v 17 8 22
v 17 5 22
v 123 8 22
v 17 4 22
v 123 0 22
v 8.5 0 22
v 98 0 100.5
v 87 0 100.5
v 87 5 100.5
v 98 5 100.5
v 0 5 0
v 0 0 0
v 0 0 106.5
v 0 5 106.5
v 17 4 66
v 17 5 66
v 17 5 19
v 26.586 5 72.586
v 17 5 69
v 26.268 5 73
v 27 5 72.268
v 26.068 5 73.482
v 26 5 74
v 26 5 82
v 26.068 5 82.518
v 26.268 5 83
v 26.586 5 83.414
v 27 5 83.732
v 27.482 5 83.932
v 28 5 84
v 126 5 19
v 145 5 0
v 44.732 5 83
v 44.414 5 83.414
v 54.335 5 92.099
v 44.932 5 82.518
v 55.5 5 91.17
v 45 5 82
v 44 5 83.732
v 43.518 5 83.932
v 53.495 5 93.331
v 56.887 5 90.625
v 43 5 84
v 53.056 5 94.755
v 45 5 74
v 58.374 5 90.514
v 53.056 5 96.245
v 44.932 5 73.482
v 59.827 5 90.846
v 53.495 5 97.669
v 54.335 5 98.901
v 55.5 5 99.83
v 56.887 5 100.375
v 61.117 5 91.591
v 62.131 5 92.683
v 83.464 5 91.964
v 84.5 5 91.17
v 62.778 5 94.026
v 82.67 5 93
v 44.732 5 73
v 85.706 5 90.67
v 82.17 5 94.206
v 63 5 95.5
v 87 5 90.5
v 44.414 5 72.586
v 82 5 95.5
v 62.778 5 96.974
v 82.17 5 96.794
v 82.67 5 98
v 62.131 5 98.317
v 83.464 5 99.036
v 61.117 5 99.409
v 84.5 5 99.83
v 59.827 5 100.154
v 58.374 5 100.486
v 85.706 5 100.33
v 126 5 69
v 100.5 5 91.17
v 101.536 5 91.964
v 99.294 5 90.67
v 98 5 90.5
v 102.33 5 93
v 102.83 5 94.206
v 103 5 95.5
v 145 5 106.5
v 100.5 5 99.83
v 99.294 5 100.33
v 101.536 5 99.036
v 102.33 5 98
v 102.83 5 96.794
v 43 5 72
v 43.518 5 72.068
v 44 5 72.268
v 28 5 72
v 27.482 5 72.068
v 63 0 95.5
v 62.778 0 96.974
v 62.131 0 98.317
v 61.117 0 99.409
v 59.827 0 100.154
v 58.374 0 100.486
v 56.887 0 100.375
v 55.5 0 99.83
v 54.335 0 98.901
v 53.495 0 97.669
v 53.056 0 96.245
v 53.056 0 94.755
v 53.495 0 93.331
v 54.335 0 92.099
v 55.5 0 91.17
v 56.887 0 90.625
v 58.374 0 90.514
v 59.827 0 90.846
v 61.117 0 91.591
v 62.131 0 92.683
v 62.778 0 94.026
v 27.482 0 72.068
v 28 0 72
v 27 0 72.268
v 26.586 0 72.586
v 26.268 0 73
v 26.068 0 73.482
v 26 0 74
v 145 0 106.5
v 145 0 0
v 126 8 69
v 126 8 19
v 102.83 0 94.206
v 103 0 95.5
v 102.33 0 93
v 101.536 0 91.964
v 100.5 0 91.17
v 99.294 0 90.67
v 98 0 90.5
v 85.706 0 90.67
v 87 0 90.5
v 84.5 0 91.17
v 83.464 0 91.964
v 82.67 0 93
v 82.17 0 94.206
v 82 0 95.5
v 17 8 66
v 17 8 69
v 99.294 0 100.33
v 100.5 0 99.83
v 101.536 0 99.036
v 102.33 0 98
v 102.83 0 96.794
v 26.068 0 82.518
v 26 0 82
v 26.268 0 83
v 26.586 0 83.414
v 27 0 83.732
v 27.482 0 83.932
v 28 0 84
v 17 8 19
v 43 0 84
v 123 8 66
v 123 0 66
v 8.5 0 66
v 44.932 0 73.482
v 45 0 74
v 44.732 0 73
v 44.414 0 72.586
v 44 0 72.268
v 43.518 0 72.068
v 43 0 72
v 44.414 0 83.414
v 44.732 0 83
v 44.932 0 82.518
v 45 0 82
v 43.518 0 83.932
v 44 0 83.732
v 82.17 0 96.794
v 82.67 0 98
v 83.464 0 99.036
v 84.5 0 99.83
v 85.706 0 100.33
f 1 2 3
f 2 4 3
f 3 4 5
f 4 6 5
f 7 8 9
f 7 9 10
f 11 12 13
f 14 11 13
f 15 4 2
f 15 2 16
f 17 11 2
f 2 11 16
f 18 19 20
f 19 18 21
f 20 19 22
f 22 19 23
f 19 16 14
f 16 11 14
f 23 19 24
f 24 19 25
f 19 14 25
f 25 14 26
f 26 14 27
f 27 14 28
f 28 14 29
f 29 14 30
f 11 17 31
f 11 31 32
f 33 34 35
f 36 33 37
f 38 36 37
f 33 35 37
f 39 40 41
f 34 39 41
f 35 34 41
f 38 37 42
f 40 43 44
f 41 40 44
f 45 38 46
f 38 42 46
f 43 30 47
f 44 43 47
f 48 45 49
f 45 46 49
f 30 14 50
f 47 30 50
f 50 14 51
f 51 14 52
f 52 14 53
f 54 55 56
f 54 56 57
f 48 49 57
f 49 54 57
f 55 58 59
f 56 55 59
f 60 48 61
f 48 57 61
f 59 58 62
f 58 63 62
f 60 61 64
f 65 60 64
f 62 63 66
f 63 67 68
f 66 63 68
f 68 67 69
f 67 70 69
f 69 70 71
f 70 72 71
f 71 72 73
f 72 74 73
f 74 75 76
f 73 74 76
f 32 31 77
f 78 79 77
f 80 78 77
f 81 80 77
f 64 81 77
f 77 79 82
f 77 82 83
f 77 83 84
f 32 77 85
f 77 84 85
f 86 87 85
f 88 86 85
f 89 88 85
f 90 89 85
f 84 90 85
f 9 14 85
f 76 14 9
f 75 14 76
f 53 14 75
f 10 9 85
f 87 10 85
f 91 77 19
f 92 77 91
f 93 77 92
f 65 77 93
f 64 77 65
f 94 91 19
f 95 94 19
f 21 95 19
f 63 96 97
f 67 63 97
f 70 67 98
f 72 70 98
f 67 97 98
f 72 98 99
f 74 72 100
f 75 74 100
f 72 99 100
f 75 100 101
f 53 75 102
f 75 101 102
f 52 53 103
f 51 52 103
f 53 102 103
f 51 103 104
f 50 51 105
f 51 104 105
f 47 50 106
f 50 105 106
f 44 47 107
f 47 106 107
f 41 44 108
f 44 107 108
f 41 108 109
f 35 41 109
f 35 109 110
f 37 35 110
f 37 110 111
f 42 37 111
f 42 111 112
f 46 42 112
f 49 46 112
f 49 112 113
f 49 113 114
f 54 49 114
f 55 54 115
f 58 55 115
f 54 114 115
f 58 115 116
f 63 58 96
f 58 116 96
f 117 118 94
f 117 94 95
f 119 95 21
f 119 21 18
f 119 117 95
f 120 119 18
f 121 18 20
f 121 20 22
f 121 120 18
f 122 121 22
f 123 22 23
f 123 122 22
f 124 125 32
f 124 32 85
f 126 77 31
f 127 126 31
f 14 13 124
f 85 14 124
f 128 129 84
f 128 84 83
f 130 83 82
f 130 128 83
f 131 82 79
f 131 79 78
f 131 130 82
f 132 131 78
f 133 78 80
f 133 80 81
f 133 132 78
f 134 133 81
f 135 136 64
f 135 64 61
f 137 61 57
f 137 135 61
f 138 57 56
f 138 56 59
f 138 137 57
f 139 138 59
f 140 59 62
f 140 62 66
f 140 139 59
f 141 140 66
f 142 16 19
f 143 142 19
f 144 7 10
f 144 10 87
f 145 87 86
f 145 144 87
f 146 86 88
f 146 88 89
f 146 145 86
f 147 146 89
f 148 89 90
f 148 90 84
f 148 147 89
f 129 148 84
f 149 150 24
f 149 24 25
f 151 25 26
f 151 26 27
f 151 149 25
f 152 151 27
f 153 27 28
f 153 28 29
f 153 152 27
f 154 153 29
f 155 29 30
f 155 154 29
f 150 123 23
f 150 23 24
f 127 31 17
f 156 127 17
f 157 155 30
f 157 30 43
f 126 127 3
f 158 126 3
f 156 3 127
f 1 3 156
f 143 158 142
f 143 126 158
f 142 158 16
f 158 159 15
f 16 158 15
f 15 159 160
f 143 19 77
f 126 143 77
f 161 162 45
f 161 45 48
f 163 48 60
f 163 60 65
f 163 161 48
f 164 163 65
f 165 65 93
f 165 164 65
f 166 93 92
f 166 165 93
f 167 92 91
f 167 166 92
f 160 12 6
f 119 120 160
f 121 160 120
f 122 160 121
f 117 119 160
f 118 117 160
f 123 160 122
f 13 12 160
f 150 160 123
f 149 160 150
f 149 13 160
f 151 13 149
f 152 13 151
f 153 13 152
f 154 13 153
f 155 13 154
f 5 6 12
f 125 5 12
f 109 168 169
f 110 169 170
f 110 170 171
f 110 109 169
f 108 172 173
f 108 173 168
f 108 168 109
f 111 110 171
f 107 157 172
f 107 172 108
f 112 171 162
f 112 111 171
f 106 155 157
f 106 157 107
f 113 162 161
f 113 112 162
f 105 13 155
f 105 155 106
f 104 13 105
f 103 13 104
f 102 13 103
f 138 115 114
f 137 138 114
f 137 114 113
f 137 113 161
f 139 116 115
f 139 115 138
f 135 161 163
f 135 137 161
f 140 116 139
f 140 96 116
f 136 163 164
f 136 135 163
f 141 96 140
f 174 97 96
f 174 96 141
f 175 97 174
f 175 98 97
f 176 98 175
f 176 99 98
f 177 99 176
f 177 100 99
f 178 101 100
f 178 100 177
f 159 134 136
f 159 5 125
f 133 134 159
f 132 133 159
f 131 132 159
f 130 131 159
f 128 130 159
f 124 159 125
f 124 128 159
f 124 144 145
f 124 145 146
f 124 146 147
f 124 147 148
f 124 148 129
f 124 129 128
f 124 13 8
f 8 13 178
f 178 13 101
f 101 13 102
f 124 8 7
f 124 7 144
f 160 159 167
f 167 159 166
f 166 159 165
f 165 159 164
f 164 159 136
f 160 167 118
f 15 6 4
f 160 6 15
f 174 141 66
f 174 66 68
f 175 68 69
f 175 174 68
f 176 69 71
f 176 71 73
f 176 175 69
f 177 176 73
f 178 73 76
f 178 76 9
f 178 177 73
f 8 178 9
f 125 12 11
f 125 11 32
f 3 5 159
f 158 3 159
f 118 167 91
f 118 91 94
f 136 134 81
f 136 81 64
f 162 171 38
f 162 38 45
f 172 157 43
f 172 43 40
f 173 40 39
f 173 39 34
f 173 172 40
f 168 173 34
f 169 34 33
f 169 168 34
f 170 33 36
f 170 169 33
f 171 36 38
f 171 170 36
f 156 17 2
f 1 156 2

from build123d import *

# Parameters (mm, degrees)
F0_W     = 145
F0_H     = 106.5
F0_W_2   = 106
F0_H_2   = 44
F0_R     = 5
F1_DEPTH = 5
F2_SIZE2 = 8.5
F2_SIZE  = 4
F4_DEPTH = 3


with BuildPart() as f1:
    # F0 (on Front) → F1 (new body)
    with BuildSketch(Plane.XZ):
        with Locations((72.5, 53.25)):
            Rectangle(F0_W, F0_H)
        with Locations((70, 44)):
            Rectangle(F0_W_2, F0_H_2, mode=Mode.SUBTRACT)
        with BuildLine():
            ThreePointArc((26, 82), (26.585786, 83.414214), (28, 84))
            Line((28, 84), (43, 84))
            ThreePointArc((43, 84), (44.414214, 83.414214), (45, 82))
            Line((45, 82), (45, 74))
            ThreePointArc((45, 74), (44.414214, 72.585786), (43, 72))
            Line((43, 72), (28, 72))
            ThreePointArc((28, 72), (26.585786, 72.585786), (26, 74))
            Line((26, 74), (26, 82))
        make_face(mode=Mode.SUBTRACT)
        with Locations((58, 95.5)):
            Circle(F0_R, mode=Mode.SUBTRACT)
        with BuildLine():
            Line((87, 100.5), (98, 100.5))
            ThreePointArc((98, 100.5), (101.535534, 99.035534), (103, 95.5))
            ThreePointArc((103, 95.5), (101.535534, 91.964466), (98, 90.5))
            Line((98, 90.5), (87, 90.5))
            ThreePointArc((87, 90.5), (83.464466, 91.964466), (82, 95.5))
            ThreePointArc((82, 95.5), (83.464466, 99.035534), (87, 100.5))
        make_face(mode=Mode.SUBTRACT)
    extrude(amount=-F1_DEPTH)

    # F2
    f2_edges = [f1.edges().sort_by_distance(p)[0] for p in [
        (17, 0, 44),
    ]]
    chamfer(f2_edges, length=F2_SIZE, length2=F2_SIZE2)

    # F3 (on face) → F4 (join)
    with BuildSketch(Plane(origin=(0, 5, 0), x_dir=(-1, 0, 0), z_dir=(0, 1, 0))):
        Polygon((-123, 66), (-17, 66), (-17, 69), (-126, 69), (-126, 19), (-17, 19), (-17, 22), (-123, 22), align=None)
    extrude(amount=F4_DEPTH)


solid = f1.part
